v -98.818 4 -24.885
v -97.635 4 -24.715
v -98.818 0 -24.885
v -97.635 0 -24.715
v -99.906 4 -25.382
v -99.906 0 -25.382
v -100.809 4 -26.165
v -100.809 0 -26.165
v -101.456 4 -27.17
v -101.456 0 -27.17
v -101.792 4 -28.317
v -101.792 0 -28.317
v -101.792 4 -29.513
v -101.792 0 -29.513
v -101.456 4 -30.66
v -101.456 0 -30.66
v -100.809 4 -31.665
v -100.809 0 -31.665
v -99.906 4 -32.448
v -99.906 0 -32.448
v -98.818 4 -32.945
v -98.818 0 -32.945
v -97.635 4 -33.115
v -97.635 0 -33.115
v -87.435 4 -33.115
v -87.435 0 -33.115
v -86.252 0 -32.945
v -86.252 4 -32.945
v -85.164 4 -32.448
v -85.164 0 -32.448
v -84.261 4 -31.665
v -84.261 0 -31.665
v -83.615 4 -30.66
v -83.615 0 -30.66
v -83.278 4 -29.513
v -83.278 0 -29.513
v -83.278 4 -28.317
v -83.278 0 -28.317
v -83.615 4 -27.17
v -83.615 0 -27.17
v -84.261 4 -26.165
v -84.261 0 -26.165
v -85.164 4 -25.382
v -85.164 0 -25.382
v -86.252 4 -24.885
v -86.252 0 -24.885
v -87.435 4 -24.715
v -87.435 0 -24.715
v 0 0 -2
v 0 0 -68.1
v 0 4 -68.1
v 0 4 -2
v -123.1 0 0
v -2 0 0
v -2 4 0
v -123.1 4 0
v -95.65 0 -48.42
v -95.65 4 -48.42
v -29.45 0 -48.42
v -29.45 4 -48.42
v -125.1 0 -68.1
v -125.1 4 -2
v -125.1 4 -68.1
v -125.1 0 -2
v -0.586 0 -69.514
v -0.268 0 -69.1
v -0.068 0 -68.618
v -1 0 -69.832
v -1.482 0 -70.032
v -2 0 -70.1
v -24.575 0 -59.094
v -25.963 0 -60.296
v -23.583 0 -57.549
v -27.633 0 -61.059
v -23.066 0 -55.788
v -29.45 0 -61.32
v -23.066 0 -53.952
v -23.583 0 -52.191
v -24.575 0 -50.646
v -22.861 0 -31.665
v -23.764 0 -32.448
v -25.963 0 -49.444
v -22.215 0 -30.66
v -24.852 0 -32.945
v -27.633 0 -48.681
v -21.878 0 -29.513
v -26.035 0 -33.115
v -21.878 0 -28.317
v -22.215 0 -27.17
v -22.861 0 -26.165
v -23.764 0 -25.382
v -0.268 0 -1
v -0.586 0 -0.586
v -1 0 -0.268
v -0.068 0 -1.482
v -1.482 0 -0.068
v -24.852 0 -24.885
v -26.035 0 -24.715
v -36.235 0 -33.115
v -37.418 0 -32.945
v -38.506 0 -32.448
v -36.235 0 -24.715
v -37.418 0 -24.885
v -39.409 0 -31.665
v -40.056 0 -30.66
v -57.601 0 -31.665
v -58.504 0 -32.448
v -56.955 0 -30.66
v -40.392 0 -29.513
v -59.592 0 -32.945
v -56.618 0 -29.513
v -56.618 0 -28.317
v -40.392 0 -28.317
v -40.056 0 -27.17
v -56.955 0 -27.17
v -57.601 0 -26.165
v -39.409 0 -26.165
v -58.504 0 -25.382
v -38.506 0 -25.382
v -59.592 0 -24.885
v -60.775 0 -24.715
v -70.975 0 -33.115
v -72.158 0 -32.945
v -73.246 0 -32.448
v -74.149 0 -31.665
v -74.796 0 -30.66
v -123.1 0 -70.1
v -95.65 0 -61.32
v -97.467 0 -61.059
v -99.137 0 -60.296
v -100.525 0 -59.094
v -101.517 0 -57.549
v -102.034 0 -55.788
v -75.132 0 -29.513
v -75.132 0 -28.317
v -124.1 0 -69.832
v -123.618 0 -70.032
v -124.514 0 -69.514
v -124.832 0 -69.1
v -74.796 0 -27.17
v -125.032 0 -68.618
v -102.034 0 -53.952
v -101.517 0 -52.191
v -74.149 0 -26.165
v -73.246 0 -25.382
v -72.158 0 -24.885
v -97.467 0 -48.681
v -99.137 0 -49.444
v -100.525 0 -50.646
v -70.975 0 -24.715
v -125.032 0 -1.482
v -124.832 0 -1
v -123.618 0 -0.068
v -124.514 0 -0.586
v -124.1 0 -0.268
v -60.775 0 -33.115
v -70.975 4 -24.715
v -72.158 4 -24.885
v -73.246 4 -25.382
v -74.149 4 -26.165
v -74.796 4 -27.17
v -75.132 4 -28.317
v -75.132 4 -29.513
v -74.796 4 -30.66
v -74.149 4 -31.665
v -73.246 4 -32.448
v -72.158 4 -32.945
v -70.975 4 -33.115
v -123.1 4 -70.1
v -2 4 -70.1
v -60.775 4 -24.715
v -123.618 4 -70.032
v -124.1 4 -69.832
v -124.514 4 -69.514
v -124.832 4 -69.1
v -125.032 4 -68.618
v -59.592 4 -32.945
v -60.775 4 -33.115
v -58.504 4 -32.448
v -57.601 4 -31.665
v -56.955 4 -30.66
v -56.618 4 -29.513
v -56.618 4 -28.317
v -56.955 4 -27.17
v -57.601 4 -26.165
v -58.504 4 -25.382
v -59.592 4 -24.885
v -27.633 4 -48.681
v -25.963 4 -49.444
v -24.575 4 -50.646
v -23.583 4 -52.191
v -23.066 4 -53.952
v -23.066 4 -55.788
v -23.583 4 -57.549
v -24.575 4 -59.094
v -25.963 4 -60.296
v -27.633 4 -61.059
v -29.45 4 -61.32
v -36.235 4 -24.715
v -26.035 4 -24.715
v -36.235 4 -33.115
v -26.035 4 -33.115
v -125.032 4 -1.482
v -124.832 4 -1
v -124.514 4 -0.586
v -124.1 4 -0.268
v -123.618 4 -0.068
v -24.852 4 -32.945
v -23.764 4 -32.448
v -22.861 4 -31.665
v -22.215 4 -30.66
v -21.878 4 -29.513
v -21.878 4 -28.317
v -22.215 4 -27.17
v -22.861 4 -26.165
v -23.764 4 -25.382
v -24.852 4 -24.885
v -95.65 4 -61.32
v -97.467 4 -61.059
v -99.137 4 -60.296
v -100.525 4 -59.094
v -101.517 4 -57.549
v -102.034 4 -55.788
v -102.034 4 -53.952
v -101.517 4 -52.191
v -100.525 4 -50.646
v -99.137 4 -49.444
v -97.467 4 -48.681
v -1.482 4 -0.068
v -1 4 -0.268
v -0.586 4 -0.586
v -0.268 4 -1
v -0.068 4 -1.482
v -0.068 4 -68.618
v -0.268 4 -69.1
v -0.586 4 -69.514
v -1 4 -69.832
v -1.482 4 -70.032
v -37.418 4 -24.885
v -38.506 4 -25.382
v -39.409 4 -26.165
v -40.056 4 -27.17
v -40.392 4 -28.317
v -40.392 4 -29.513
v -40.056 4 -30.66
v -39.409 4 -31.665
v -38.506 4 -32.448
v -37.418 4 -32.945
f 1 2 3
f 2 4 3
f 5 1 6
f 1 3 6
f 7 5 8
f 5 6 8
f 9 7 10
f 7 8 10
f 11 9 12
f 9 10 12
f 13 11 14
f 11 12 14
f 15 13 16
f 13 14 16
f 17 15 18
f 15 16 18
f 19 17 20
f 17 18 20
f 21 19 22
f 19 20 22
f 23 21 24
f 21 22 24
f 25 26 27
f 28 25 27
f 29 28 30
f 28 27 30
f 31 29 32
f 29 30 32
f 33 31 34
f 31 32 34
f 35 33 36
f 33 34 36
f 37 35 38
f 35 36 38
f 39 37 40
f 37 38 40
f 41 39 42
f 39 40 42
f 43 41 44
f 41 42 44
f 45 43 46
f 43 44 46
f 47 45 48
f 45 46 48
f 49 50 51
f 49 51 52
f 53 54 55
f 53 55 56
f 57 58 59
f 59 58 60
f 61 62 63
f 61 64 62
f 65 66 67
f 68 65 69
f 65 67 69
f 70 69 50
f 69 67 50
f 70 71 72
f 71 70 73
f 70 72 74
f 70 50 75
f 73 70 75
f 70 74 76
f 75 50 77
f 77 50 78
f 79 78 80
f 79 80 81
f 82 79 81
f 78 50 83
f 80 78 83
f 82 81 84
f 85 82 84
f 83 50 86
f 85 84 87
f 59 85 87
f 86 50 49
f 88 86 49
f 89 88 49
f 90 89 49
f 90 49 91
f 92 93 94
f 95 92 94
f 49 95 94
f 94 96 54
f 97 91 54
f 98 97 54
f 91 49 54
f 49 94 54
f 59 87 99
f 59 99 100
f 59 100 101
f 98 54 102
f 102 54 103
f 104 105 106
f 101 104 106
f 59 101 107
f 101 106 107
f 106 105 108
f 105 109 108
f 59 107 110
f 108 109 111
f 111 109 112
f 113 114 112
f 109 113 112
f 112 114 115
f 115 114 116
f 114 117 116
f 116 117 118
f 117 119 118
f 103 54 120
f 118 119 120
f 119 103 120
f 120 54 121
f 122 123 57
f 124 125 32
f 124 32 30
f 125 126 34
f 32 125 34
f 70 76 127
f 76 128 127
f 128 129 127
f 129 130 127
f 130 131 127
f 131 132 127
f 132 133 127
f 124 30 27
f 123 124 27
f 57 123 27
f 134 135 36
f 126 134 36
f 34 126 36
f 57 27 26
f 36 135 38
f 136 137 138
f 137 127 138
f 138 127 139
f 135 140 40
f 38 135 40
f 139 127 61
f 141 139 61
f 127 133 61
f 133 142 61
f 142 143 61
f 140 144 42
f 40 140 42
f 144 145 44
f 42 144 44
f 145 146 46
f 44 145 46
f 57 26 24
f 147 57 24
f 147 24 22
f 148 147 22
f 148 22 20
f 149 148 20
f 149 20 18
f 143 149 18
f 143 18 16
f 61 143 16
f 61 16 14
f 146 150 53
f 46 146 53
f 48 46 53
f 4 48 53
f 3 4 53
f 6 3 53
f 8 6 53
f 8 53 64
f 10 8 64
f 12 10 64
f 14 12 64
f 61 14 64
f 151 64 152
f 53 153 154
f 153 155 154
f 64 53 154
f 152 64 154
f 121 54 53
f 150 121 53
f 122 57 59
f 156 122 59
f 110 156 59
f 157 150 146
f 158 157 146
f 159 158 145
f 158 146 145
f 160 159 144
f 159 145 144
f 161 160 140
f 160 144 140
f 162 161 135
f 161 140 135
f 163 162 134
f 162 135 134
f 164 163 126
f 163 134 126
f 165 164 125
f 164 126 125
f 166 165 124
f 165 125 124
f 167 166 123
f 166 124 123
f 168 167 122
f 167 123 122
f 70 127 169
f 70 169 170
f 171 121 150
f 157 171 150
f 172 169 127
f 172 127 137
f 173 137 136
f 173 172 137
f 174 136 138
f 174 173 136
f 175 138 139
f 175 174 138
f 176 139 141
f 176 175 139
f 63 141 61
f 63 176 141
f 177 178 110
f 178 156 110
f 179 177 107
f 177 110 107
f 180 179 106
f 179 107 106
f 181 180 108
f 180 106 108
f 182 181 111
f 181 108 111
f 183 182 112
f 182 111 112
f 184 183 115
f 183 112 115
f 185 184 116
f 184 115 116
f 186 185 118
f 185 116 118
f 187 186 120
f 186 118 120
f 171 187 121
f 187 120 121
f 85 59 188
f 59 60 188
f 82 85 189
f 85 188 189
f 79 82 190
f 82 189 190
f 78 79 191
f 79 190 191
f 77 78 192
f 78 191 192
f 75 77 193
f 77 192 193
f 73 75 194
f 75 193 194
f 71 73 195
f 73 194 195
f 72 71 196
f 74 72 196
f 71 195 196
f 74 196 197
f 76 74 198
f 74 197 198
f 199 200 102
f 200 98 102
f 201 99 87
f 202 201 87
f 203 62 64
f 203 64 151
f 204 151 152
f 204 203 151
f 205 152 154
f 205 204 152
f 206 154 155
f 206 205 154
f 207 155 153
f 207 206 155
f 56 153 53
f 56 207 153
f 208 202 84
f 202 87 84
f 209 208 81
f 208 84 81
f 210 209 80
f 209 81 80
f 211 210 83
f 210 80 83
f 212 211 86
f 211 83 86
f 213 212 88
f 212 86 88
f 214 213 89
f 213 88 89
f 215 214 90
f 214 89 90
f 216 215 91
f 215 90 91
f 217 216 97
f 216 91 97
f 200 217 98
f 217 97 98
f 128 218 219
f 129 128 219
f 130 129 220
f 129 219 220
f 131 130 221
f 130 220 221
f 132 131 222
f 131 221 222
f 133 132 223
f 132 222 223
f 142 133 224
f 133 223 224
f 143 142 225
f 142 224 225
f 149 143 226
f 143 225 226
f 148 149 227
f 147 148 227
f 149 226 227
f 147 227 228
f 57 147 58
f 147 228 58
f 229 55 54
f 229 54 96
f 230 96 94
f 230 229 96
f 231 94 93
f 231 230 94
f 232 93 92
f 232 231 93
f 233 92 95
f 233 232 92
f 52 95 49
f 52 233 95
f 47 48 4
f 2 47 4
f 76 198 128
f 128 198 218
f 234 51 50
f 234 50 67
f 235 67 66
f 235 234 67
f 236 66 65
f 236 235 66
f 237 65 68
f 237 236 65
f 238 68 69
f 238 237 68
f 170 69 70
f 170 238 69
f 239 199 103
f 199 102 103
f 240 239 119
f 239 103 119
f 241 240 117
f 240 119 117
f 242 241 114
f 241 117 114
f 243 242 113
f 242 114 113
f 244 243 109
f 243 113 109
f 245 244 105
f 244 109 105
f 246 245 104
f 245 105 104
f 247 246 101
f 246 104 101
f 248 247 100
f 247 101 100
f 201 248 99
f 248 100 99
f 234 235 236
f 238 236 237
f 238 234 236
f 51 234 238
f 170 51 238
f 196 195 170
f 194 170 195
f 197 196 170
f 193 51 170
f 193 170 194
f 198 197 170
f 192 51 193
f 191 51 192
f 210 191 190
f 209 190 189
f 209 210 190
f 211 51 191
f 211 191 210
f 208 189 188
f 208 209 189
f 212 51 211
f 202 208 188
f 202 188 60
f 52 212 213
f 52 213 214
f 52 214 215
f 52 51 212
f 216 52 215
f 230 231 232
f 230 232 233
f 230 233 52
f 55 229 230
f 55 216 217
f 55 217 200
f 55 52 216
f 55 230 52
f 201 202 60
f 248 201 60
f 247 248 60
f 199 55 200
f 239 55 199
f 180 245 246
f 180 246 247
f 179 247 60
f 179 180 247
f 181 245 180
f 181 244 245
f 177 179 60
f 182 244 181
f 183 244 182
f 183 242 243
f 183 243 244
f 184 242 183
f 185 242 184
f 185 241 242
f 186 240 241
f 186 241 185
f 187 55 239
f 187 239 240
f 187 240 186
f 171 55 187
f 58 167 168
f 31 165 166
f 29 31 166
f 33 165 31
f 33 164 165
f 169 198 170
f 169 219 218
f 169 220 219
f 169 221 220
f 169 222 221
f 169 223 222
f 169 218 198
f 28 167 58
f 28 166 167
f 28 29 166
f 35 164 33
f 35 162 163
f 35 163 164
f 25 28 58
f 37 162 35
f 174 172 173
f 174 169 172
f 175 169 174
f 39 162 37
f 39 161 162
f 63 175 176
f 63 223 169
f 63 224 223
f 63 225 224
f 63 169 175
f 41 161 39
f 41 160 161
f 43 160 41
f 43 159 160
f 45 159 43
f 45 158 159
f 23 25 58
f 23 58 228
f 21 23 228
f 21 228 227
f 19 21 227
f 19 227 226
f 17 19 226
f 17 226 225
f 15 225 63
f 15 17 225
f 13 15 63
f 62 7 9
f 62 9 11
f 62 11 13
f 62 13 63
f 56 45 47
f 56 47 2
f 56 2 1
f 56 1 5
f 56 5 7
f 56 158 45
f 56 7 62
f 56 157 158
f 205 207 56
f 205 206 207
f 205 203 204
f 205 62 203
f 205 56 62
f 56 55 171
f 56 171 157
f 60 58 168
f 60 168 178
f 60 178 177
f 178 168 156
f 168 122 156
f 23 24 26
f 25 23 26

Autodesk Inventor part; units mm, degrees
ref_plane "YZ Plane" through (0, 0, 0) normal (1, 0, 0) x (0, 1, 0)
ref_plane "XZ Plane" through (0, 0, 0) normal (0, 1, 0) x (-1, 0, 0)
ref_plane "XY Plane" through (0, 0, 0) normal (0, 0, 1) x (1, 0, 0)
sketch "Sketch2" plane through (0, 0, 0) normal (0, 1, 0) x (-1, 0, 0)
  line L0 (0, 0) -> (125.1, 0)
  line L1 (125.1, 0) -> (125.1, -70.1)
  line L2 (125.1, -70.1) -> (0, -70.1)
  line L3 (0, -70.1) -> (0, 0)
  dimension "d5" = 70.1
  dimension "d6" = 125.1
extrude "Extrusion2" add sketch "Sketch2" along normal blind 4
fillet "Fillet1" radius 2 4 edges at (-125.1, 2, 0) (-125.1, 2, -70.1) (0, 2, 0) (0, 2, -70.1)
sketch "Sketch4" plane through (0, 0, 0) normal (0, -1, 0) x (1, 0, 0)
  line L0 (-60.7951, -25.715) -> (-60.7951, -33.115) projected
  line L1 (-60.7951, -33.115) -> (-70.9551, -33.115) projected
  line L2 (-70.9551, -25.715) -> (-70.9551, -33.115) projected
  line L3 (-60.7951, -25.715) -> (-70.9551, -25.715) projected
  line L4 (-70.2151, -31.515) -> (-66.6151, -31.515) projected
  line L5 (-66.6151, -31.515) -> (-66.6151, -26.315) projected
  line L6 (-66.6151, -26.315) -> (-70.2151, -26.315) projected
  line L7 (-70.2151, -26.315) -> (-70.2151, -31.515) projected
  line L8 (-65.1351, -31.515) -> (-61.5351, -31.515) projected
  line L9 (-61.5351, -31.515) -> (-61.5351, -26.315) projected
  line L10 (-61.5351, -26.315) -> (-65.1351, -26.315) projected
  line L11 (-65.1351, -26.315) -> (-65.1351, -31.515) projected
  line L12 (-87.4551, -25.715) -> (-87.4551, -33.115) projected
  line L13 (-87.4551, -33.115) -> (-97.6151, -33.115) projected
  line L14 (-97.6151, -25.715) -> (-97.6151, -33.115) projected
  line L15 (-87.4551, -25.715) -> (-97.6151, -25.715) projected
  line L16 (-96.8751, -31.515) -> (-93.2751, -31.515) projected
  line L17 (-93.2751, -31.515) -> (-93.2751, -26.315) projected
  line L18 (-93.2751, -26.315) -> (-96.8751, -26.315) projected
  line L19 (-96.8751, -26.315) -> (-96.8751, -31.515) projected
  line L20 (-91.7951, -31.515) -> (-88.1951, -31.515) projected
  line L21 (-88.1951, -31.515) -> (-88.1951, -26.315) projected
  line L22 (-88.1951, -26.315) -> (-91.7951, -26.315) projected
  line L23 (-91.7951, -26.315) -> (-91.7951, -31.515) projected
  line L24 (-26.0551, -25.715) -> (-26.0551, -33.115) projected
  line L25 (-26.0551, -33.115) -> (-36.2151, -33.115) projected
  line L26 (-36.2151, -25.715) -> (-36.2151, -33.115) projected
  line L27 (-26.0551, -25.715) -> (-36.2151, -25.715) projected
  line L28 (-35.4751, -31.515) -> (-31.8751, -31.515) projected
  line L29 (-31.8751, -31.515) -> (-31.8751, -26.315) projected
  line L30 (-31.8751, -26.315) -> (-35.4751, -26.315) projected
  line L31 (-35.4751, -26.315) -> (-35.4751, -31.515) projected
  line L32 (-30.3951, -31.515) -> (-26.7951, -31.515) projected
  line L33 (-26.7951, -31.515) -> (-26.7951, -26.315) projected
  line L34 (-26.7951, -26.315) -> (-30.3951, -26.315) projected
  line L35 (-30.3951, -26.315) -> (-30.3951, -31.515) projected
  line L36 (-101.8351, -28.915) -> (-21.8351, -28.915) construction
  line L37 (-97.6351, -33.115) -> (-26.0351, -33.115) construction
  line L38 (-26.0351, -24.715) -> (-97.6351, -24.715) construction
  arc A0 (-97.6351, -24.715) -> (-97.6351, -33.115) centre (-97.6351, -28.915) ccw
  arc A1 (-26.0351, -33.115) -> (-26.0351, -24.715) centre (-26.0351, -28.915) ccw
  line L39 (-97.6151, -25.715) -> (-97.6151, -10.355) construction
  line L40 (-26.0551, -25.715) -> (-26.0551, -14.2023) construction
  line L41 (-101.8351, -28.915) -> (-101.8351, -10.355) construction
  line L42 (-101.8351, -10.355) -> (-97.6151, -10.355) construction
  line L43 (-26.0551, -14.2023) -> (-21.8351, -14.2023) construction
  line L44 (-21.8351, -14.2023) -> (-21.8351, -28.915) construction
  line L45 (-101.8351, -28.915) -> (-83.2351, -28.915) construction
  line L46 (-97.6351, -33.115) -> (-87.4351, -33.115)
  line L47 (-87.4351, -24.715) -> (-97.6351, -24.715)
  arc A2 (-97.6351, -24.715) -> (-97.6351, -33.115) centre (-97.6351, -28.915) ccw
  arc A3 (-87.4351, -33.115) -> (-87.4351, -24.715) centre (-87.4351, -28.915) ccw
  line L48 (-75.1751, -28.915) -> (-56.5751, -28.915) construction
  line L49 (-70.9751, -33.115) -> (-60.7751, -33.115)
  line L50 (-60.7751, -24.715) -> (-70.9751, -24.715)
  arc A4 (-70.9751, -24.715) -> (-70.9751, -33.115) centre (-70.9751, -28.915) ccw
  arc A5 (-60.7751, -33.115) -> (-60.7751, -24.715) centre (-60.7751, -28.915) ccw
  line L51 (-40.4351, -28.915) -> (-21.8351, -28.915) construction
  line L52 (-36.2351, -33.115) -> (-26.0351, -33.115)
  line L53 (-26.0351, -24.715) -> (-36.2351, -24.715)
  arc A6 (-36.2351, -24.715) -> (-36.2351, -33.115) centre (-36.2351, -28.915) ccw
  arc A7 (-26.0351, -33.115) -> (-26.0351, -24.715) centre (-26.0351, -28.915) ccw
  point P0 (0, 0)
  point P1 (-61.8351, -28.915)
  point P2 (-92.5351, -28.915)
  point P3 (-65.8751, -28.915)
  point P4 (-31.1351, -28.915)
  point P5 (-97.6351, -24.715)
  point P6 (-26.0351, -33.115)
  point P7 (-26.0351, -24.715)
  dimension "d10" = 80
  dimension "d11" = 0
  dimension "d12" = 1
  dimension "d13" = 4.22
  dimension "d14" = 4.22
  dimension "d15" = 4.22
  dimension "d16" = 4.22
  dimension "d17" = 4.22
extrude "Extrusion3" cut sketch "Sketch4" against normal blind 10 contours L3 L2 L49 A4 L50 A5 L0 | L0 L1 L2 L3 | L7 L6 L5 L4 | L11 L10 L9 L8 | L15 L14 L46 A0 L47 A3 L12 | L12 L13 L14 L15 | L19 L18 L17 L16 | L23 L22 L21 L20 | L27 L26 L52 A6 L53 A1 L24 | L24 L25 L26 L27 | L31 L30 L29 L28 | L35 L34 L33 L32
sketch "Sketch5" plane through (0, 4, 0) normal (0, 1, 0) x (1, 0, 0)
  line L0 (-44.9757, 55.92) -> (-50.6457, 55.92) construction
  arc A0 (-50.6457, 55.92) -> (-50.7457, 55.82) centre (-50.6457, 55.82) ccw construction
  line L1 (-50.7457, 55.82) -> (-50.7457, 55.006) construction
  arc A1 (-51.0707, 54.4431) -> (-50.7457, 55.006) centre (-51.3957, 55.006) ccw construction
  line L2 (-51.0707, 54.4431) -> (-51.2107, 54.3623) construction
  arc A2 (-51.2107, 54.3623) -> (-51.2607, 54.2757) centre (-51.1607, 54.2757) ccw construction
  line L3 (-51.2607, 54.2757) -> (-51.2607, 52.82) construction
  line L4 (-51.2607, 52.82) -> (-44.3607, 52.82) construction
  line L5 (-44.3607, 52.82) -> (-44.3607, 54.2757) construction
  arc A3 (-44.3607, 54.2757) -> (-44.4107, 54.3623) centre (-44.4607, 54.2757) ccw construction
  line L6 (-44.4107, 54.3623) -> (-44.5507, 54.4431) construction
  arc A4 (-44.8757, 55.006) -> (-44.5507, 54.4431) centre (-44.2257, 55.006) ccw construction
  line L7 (-44.8757, 55.006) -> (-44.8757, 55.82) construction
  arc A5 (-44.8757, 55.82) -> (-44.9757, 55.92) centre (-44.9757, 55.82) ccw construction
  line L8 (-50.8957, 56.32) -> (-44.7257, 56.32) construction
  arc A6 (-44.4757, 56.07) -> (-44.7257, 56.32) centre (-44.7257, 56.07) ccw construction
  line L9 (-44.4757, 56.07) -> (-44.4757, 55.006) construction
  arc A7 (-44.4757, 55.006) -> (-44.3507, 54.7895) centre (-44.2257, 55.006) ccw construction
  line L10 (-44.3507, 54.7895) -> (-44.0857, 54.6365) construction
  arc A8 (-43.9607, 54.42) -> (-44.0857, 54.6365) centre (-44.2107, 54.42) ccw construction
  line L11 (-43.9607, 54.42) -> (-43.9607, 52.82) construction
  arc A9 (-44.3607, 52.42) -> (-43.9607, 52.82) centre (-44.3607, 52.82) ccw construction
  line L12 (-44.3607, 52.42) -> (-51.2607, 52.42) construction
  arc A10 (-51.6607, 52.82) -> (-51.2607, 52.42) centre (-51.2607, 52.82) ccw construction
  line L13 (-51.6607, 52.82) -> (-51.6607, 54.42) construction
  arc A11 (-51.5357, 54.6365) -> (-51.6607, 54.42) centre (-51.4107, 54.42) ccw construction
  line L14 (-51.5357, 54.6365) -> (-51.2707, 54.7895) construction
  arc A12 (-51.2707, 54.7895) -> (-51.1457, 55.006) centre (-51.3957, 55.006) ccw construction
  line L15 (-51.1457, 55.006) -> (-51.1457, 56.07) construction
  arc A13 (-50.8957, 56.32) -> (-51.1457, 56.07) centre (-50.8957, 56.07) ccw construction
  line L16 (-23, 54.87) -> (-102.1, 54.87) construction
  line L17 (-29.45, 61.32) -> (-95.65, 61.32)
  line L18 (-95.65, 48.42) -> (-29.45, 48.42)
  arc A14 (-29.45, 48.42) -> (-29.45, 61.32) centre (-29.45, 54.87) ccw
  arc A15 (-95.65, 61.32) -> (-95.65, 48.42) centre (-95.65, 54.87) ccw
  line L19 (0, 2) -> (0, 68.1) projected
  line L20 (-125.1, 68.1) -> (-125.1, 2) projected
  point P0 (0, 0)
  point P1 (-62.55, 54.87)
  dimension "d20" = 23
  dimension "d21" = 5
  dimension "d22" = 4
  dimension "d23" = 23
extrude "Extrusion4" cut sketch "Sketch5" against normal blind 7.75
equation "\"d14\" = d13"
equation "\"d15\" = d14"
equation "\"d16\" = d15"
equation "\"d17\" = d16"
equation "\"d23\" = d20"
equation "\"BendRadius\" = Thickness"
equation "\"BendReliefWidth\" = Thickness"
equation "\"BendReliefDepth\" = 0.5 * Thickness"
equation "\"CornerReliefSize\" = 4 * Thickness"
equation "\"MinimumRemnant\" = 2 * Thickness"
equation "\"TransitionRadius\" = BendRadius"
equation "\"JacobiRadiusSize\" = Thickness"
equation "\"GapSize\" = Thickness"
equation "\"Thickness\" = 0.5"
properties part number "back"
